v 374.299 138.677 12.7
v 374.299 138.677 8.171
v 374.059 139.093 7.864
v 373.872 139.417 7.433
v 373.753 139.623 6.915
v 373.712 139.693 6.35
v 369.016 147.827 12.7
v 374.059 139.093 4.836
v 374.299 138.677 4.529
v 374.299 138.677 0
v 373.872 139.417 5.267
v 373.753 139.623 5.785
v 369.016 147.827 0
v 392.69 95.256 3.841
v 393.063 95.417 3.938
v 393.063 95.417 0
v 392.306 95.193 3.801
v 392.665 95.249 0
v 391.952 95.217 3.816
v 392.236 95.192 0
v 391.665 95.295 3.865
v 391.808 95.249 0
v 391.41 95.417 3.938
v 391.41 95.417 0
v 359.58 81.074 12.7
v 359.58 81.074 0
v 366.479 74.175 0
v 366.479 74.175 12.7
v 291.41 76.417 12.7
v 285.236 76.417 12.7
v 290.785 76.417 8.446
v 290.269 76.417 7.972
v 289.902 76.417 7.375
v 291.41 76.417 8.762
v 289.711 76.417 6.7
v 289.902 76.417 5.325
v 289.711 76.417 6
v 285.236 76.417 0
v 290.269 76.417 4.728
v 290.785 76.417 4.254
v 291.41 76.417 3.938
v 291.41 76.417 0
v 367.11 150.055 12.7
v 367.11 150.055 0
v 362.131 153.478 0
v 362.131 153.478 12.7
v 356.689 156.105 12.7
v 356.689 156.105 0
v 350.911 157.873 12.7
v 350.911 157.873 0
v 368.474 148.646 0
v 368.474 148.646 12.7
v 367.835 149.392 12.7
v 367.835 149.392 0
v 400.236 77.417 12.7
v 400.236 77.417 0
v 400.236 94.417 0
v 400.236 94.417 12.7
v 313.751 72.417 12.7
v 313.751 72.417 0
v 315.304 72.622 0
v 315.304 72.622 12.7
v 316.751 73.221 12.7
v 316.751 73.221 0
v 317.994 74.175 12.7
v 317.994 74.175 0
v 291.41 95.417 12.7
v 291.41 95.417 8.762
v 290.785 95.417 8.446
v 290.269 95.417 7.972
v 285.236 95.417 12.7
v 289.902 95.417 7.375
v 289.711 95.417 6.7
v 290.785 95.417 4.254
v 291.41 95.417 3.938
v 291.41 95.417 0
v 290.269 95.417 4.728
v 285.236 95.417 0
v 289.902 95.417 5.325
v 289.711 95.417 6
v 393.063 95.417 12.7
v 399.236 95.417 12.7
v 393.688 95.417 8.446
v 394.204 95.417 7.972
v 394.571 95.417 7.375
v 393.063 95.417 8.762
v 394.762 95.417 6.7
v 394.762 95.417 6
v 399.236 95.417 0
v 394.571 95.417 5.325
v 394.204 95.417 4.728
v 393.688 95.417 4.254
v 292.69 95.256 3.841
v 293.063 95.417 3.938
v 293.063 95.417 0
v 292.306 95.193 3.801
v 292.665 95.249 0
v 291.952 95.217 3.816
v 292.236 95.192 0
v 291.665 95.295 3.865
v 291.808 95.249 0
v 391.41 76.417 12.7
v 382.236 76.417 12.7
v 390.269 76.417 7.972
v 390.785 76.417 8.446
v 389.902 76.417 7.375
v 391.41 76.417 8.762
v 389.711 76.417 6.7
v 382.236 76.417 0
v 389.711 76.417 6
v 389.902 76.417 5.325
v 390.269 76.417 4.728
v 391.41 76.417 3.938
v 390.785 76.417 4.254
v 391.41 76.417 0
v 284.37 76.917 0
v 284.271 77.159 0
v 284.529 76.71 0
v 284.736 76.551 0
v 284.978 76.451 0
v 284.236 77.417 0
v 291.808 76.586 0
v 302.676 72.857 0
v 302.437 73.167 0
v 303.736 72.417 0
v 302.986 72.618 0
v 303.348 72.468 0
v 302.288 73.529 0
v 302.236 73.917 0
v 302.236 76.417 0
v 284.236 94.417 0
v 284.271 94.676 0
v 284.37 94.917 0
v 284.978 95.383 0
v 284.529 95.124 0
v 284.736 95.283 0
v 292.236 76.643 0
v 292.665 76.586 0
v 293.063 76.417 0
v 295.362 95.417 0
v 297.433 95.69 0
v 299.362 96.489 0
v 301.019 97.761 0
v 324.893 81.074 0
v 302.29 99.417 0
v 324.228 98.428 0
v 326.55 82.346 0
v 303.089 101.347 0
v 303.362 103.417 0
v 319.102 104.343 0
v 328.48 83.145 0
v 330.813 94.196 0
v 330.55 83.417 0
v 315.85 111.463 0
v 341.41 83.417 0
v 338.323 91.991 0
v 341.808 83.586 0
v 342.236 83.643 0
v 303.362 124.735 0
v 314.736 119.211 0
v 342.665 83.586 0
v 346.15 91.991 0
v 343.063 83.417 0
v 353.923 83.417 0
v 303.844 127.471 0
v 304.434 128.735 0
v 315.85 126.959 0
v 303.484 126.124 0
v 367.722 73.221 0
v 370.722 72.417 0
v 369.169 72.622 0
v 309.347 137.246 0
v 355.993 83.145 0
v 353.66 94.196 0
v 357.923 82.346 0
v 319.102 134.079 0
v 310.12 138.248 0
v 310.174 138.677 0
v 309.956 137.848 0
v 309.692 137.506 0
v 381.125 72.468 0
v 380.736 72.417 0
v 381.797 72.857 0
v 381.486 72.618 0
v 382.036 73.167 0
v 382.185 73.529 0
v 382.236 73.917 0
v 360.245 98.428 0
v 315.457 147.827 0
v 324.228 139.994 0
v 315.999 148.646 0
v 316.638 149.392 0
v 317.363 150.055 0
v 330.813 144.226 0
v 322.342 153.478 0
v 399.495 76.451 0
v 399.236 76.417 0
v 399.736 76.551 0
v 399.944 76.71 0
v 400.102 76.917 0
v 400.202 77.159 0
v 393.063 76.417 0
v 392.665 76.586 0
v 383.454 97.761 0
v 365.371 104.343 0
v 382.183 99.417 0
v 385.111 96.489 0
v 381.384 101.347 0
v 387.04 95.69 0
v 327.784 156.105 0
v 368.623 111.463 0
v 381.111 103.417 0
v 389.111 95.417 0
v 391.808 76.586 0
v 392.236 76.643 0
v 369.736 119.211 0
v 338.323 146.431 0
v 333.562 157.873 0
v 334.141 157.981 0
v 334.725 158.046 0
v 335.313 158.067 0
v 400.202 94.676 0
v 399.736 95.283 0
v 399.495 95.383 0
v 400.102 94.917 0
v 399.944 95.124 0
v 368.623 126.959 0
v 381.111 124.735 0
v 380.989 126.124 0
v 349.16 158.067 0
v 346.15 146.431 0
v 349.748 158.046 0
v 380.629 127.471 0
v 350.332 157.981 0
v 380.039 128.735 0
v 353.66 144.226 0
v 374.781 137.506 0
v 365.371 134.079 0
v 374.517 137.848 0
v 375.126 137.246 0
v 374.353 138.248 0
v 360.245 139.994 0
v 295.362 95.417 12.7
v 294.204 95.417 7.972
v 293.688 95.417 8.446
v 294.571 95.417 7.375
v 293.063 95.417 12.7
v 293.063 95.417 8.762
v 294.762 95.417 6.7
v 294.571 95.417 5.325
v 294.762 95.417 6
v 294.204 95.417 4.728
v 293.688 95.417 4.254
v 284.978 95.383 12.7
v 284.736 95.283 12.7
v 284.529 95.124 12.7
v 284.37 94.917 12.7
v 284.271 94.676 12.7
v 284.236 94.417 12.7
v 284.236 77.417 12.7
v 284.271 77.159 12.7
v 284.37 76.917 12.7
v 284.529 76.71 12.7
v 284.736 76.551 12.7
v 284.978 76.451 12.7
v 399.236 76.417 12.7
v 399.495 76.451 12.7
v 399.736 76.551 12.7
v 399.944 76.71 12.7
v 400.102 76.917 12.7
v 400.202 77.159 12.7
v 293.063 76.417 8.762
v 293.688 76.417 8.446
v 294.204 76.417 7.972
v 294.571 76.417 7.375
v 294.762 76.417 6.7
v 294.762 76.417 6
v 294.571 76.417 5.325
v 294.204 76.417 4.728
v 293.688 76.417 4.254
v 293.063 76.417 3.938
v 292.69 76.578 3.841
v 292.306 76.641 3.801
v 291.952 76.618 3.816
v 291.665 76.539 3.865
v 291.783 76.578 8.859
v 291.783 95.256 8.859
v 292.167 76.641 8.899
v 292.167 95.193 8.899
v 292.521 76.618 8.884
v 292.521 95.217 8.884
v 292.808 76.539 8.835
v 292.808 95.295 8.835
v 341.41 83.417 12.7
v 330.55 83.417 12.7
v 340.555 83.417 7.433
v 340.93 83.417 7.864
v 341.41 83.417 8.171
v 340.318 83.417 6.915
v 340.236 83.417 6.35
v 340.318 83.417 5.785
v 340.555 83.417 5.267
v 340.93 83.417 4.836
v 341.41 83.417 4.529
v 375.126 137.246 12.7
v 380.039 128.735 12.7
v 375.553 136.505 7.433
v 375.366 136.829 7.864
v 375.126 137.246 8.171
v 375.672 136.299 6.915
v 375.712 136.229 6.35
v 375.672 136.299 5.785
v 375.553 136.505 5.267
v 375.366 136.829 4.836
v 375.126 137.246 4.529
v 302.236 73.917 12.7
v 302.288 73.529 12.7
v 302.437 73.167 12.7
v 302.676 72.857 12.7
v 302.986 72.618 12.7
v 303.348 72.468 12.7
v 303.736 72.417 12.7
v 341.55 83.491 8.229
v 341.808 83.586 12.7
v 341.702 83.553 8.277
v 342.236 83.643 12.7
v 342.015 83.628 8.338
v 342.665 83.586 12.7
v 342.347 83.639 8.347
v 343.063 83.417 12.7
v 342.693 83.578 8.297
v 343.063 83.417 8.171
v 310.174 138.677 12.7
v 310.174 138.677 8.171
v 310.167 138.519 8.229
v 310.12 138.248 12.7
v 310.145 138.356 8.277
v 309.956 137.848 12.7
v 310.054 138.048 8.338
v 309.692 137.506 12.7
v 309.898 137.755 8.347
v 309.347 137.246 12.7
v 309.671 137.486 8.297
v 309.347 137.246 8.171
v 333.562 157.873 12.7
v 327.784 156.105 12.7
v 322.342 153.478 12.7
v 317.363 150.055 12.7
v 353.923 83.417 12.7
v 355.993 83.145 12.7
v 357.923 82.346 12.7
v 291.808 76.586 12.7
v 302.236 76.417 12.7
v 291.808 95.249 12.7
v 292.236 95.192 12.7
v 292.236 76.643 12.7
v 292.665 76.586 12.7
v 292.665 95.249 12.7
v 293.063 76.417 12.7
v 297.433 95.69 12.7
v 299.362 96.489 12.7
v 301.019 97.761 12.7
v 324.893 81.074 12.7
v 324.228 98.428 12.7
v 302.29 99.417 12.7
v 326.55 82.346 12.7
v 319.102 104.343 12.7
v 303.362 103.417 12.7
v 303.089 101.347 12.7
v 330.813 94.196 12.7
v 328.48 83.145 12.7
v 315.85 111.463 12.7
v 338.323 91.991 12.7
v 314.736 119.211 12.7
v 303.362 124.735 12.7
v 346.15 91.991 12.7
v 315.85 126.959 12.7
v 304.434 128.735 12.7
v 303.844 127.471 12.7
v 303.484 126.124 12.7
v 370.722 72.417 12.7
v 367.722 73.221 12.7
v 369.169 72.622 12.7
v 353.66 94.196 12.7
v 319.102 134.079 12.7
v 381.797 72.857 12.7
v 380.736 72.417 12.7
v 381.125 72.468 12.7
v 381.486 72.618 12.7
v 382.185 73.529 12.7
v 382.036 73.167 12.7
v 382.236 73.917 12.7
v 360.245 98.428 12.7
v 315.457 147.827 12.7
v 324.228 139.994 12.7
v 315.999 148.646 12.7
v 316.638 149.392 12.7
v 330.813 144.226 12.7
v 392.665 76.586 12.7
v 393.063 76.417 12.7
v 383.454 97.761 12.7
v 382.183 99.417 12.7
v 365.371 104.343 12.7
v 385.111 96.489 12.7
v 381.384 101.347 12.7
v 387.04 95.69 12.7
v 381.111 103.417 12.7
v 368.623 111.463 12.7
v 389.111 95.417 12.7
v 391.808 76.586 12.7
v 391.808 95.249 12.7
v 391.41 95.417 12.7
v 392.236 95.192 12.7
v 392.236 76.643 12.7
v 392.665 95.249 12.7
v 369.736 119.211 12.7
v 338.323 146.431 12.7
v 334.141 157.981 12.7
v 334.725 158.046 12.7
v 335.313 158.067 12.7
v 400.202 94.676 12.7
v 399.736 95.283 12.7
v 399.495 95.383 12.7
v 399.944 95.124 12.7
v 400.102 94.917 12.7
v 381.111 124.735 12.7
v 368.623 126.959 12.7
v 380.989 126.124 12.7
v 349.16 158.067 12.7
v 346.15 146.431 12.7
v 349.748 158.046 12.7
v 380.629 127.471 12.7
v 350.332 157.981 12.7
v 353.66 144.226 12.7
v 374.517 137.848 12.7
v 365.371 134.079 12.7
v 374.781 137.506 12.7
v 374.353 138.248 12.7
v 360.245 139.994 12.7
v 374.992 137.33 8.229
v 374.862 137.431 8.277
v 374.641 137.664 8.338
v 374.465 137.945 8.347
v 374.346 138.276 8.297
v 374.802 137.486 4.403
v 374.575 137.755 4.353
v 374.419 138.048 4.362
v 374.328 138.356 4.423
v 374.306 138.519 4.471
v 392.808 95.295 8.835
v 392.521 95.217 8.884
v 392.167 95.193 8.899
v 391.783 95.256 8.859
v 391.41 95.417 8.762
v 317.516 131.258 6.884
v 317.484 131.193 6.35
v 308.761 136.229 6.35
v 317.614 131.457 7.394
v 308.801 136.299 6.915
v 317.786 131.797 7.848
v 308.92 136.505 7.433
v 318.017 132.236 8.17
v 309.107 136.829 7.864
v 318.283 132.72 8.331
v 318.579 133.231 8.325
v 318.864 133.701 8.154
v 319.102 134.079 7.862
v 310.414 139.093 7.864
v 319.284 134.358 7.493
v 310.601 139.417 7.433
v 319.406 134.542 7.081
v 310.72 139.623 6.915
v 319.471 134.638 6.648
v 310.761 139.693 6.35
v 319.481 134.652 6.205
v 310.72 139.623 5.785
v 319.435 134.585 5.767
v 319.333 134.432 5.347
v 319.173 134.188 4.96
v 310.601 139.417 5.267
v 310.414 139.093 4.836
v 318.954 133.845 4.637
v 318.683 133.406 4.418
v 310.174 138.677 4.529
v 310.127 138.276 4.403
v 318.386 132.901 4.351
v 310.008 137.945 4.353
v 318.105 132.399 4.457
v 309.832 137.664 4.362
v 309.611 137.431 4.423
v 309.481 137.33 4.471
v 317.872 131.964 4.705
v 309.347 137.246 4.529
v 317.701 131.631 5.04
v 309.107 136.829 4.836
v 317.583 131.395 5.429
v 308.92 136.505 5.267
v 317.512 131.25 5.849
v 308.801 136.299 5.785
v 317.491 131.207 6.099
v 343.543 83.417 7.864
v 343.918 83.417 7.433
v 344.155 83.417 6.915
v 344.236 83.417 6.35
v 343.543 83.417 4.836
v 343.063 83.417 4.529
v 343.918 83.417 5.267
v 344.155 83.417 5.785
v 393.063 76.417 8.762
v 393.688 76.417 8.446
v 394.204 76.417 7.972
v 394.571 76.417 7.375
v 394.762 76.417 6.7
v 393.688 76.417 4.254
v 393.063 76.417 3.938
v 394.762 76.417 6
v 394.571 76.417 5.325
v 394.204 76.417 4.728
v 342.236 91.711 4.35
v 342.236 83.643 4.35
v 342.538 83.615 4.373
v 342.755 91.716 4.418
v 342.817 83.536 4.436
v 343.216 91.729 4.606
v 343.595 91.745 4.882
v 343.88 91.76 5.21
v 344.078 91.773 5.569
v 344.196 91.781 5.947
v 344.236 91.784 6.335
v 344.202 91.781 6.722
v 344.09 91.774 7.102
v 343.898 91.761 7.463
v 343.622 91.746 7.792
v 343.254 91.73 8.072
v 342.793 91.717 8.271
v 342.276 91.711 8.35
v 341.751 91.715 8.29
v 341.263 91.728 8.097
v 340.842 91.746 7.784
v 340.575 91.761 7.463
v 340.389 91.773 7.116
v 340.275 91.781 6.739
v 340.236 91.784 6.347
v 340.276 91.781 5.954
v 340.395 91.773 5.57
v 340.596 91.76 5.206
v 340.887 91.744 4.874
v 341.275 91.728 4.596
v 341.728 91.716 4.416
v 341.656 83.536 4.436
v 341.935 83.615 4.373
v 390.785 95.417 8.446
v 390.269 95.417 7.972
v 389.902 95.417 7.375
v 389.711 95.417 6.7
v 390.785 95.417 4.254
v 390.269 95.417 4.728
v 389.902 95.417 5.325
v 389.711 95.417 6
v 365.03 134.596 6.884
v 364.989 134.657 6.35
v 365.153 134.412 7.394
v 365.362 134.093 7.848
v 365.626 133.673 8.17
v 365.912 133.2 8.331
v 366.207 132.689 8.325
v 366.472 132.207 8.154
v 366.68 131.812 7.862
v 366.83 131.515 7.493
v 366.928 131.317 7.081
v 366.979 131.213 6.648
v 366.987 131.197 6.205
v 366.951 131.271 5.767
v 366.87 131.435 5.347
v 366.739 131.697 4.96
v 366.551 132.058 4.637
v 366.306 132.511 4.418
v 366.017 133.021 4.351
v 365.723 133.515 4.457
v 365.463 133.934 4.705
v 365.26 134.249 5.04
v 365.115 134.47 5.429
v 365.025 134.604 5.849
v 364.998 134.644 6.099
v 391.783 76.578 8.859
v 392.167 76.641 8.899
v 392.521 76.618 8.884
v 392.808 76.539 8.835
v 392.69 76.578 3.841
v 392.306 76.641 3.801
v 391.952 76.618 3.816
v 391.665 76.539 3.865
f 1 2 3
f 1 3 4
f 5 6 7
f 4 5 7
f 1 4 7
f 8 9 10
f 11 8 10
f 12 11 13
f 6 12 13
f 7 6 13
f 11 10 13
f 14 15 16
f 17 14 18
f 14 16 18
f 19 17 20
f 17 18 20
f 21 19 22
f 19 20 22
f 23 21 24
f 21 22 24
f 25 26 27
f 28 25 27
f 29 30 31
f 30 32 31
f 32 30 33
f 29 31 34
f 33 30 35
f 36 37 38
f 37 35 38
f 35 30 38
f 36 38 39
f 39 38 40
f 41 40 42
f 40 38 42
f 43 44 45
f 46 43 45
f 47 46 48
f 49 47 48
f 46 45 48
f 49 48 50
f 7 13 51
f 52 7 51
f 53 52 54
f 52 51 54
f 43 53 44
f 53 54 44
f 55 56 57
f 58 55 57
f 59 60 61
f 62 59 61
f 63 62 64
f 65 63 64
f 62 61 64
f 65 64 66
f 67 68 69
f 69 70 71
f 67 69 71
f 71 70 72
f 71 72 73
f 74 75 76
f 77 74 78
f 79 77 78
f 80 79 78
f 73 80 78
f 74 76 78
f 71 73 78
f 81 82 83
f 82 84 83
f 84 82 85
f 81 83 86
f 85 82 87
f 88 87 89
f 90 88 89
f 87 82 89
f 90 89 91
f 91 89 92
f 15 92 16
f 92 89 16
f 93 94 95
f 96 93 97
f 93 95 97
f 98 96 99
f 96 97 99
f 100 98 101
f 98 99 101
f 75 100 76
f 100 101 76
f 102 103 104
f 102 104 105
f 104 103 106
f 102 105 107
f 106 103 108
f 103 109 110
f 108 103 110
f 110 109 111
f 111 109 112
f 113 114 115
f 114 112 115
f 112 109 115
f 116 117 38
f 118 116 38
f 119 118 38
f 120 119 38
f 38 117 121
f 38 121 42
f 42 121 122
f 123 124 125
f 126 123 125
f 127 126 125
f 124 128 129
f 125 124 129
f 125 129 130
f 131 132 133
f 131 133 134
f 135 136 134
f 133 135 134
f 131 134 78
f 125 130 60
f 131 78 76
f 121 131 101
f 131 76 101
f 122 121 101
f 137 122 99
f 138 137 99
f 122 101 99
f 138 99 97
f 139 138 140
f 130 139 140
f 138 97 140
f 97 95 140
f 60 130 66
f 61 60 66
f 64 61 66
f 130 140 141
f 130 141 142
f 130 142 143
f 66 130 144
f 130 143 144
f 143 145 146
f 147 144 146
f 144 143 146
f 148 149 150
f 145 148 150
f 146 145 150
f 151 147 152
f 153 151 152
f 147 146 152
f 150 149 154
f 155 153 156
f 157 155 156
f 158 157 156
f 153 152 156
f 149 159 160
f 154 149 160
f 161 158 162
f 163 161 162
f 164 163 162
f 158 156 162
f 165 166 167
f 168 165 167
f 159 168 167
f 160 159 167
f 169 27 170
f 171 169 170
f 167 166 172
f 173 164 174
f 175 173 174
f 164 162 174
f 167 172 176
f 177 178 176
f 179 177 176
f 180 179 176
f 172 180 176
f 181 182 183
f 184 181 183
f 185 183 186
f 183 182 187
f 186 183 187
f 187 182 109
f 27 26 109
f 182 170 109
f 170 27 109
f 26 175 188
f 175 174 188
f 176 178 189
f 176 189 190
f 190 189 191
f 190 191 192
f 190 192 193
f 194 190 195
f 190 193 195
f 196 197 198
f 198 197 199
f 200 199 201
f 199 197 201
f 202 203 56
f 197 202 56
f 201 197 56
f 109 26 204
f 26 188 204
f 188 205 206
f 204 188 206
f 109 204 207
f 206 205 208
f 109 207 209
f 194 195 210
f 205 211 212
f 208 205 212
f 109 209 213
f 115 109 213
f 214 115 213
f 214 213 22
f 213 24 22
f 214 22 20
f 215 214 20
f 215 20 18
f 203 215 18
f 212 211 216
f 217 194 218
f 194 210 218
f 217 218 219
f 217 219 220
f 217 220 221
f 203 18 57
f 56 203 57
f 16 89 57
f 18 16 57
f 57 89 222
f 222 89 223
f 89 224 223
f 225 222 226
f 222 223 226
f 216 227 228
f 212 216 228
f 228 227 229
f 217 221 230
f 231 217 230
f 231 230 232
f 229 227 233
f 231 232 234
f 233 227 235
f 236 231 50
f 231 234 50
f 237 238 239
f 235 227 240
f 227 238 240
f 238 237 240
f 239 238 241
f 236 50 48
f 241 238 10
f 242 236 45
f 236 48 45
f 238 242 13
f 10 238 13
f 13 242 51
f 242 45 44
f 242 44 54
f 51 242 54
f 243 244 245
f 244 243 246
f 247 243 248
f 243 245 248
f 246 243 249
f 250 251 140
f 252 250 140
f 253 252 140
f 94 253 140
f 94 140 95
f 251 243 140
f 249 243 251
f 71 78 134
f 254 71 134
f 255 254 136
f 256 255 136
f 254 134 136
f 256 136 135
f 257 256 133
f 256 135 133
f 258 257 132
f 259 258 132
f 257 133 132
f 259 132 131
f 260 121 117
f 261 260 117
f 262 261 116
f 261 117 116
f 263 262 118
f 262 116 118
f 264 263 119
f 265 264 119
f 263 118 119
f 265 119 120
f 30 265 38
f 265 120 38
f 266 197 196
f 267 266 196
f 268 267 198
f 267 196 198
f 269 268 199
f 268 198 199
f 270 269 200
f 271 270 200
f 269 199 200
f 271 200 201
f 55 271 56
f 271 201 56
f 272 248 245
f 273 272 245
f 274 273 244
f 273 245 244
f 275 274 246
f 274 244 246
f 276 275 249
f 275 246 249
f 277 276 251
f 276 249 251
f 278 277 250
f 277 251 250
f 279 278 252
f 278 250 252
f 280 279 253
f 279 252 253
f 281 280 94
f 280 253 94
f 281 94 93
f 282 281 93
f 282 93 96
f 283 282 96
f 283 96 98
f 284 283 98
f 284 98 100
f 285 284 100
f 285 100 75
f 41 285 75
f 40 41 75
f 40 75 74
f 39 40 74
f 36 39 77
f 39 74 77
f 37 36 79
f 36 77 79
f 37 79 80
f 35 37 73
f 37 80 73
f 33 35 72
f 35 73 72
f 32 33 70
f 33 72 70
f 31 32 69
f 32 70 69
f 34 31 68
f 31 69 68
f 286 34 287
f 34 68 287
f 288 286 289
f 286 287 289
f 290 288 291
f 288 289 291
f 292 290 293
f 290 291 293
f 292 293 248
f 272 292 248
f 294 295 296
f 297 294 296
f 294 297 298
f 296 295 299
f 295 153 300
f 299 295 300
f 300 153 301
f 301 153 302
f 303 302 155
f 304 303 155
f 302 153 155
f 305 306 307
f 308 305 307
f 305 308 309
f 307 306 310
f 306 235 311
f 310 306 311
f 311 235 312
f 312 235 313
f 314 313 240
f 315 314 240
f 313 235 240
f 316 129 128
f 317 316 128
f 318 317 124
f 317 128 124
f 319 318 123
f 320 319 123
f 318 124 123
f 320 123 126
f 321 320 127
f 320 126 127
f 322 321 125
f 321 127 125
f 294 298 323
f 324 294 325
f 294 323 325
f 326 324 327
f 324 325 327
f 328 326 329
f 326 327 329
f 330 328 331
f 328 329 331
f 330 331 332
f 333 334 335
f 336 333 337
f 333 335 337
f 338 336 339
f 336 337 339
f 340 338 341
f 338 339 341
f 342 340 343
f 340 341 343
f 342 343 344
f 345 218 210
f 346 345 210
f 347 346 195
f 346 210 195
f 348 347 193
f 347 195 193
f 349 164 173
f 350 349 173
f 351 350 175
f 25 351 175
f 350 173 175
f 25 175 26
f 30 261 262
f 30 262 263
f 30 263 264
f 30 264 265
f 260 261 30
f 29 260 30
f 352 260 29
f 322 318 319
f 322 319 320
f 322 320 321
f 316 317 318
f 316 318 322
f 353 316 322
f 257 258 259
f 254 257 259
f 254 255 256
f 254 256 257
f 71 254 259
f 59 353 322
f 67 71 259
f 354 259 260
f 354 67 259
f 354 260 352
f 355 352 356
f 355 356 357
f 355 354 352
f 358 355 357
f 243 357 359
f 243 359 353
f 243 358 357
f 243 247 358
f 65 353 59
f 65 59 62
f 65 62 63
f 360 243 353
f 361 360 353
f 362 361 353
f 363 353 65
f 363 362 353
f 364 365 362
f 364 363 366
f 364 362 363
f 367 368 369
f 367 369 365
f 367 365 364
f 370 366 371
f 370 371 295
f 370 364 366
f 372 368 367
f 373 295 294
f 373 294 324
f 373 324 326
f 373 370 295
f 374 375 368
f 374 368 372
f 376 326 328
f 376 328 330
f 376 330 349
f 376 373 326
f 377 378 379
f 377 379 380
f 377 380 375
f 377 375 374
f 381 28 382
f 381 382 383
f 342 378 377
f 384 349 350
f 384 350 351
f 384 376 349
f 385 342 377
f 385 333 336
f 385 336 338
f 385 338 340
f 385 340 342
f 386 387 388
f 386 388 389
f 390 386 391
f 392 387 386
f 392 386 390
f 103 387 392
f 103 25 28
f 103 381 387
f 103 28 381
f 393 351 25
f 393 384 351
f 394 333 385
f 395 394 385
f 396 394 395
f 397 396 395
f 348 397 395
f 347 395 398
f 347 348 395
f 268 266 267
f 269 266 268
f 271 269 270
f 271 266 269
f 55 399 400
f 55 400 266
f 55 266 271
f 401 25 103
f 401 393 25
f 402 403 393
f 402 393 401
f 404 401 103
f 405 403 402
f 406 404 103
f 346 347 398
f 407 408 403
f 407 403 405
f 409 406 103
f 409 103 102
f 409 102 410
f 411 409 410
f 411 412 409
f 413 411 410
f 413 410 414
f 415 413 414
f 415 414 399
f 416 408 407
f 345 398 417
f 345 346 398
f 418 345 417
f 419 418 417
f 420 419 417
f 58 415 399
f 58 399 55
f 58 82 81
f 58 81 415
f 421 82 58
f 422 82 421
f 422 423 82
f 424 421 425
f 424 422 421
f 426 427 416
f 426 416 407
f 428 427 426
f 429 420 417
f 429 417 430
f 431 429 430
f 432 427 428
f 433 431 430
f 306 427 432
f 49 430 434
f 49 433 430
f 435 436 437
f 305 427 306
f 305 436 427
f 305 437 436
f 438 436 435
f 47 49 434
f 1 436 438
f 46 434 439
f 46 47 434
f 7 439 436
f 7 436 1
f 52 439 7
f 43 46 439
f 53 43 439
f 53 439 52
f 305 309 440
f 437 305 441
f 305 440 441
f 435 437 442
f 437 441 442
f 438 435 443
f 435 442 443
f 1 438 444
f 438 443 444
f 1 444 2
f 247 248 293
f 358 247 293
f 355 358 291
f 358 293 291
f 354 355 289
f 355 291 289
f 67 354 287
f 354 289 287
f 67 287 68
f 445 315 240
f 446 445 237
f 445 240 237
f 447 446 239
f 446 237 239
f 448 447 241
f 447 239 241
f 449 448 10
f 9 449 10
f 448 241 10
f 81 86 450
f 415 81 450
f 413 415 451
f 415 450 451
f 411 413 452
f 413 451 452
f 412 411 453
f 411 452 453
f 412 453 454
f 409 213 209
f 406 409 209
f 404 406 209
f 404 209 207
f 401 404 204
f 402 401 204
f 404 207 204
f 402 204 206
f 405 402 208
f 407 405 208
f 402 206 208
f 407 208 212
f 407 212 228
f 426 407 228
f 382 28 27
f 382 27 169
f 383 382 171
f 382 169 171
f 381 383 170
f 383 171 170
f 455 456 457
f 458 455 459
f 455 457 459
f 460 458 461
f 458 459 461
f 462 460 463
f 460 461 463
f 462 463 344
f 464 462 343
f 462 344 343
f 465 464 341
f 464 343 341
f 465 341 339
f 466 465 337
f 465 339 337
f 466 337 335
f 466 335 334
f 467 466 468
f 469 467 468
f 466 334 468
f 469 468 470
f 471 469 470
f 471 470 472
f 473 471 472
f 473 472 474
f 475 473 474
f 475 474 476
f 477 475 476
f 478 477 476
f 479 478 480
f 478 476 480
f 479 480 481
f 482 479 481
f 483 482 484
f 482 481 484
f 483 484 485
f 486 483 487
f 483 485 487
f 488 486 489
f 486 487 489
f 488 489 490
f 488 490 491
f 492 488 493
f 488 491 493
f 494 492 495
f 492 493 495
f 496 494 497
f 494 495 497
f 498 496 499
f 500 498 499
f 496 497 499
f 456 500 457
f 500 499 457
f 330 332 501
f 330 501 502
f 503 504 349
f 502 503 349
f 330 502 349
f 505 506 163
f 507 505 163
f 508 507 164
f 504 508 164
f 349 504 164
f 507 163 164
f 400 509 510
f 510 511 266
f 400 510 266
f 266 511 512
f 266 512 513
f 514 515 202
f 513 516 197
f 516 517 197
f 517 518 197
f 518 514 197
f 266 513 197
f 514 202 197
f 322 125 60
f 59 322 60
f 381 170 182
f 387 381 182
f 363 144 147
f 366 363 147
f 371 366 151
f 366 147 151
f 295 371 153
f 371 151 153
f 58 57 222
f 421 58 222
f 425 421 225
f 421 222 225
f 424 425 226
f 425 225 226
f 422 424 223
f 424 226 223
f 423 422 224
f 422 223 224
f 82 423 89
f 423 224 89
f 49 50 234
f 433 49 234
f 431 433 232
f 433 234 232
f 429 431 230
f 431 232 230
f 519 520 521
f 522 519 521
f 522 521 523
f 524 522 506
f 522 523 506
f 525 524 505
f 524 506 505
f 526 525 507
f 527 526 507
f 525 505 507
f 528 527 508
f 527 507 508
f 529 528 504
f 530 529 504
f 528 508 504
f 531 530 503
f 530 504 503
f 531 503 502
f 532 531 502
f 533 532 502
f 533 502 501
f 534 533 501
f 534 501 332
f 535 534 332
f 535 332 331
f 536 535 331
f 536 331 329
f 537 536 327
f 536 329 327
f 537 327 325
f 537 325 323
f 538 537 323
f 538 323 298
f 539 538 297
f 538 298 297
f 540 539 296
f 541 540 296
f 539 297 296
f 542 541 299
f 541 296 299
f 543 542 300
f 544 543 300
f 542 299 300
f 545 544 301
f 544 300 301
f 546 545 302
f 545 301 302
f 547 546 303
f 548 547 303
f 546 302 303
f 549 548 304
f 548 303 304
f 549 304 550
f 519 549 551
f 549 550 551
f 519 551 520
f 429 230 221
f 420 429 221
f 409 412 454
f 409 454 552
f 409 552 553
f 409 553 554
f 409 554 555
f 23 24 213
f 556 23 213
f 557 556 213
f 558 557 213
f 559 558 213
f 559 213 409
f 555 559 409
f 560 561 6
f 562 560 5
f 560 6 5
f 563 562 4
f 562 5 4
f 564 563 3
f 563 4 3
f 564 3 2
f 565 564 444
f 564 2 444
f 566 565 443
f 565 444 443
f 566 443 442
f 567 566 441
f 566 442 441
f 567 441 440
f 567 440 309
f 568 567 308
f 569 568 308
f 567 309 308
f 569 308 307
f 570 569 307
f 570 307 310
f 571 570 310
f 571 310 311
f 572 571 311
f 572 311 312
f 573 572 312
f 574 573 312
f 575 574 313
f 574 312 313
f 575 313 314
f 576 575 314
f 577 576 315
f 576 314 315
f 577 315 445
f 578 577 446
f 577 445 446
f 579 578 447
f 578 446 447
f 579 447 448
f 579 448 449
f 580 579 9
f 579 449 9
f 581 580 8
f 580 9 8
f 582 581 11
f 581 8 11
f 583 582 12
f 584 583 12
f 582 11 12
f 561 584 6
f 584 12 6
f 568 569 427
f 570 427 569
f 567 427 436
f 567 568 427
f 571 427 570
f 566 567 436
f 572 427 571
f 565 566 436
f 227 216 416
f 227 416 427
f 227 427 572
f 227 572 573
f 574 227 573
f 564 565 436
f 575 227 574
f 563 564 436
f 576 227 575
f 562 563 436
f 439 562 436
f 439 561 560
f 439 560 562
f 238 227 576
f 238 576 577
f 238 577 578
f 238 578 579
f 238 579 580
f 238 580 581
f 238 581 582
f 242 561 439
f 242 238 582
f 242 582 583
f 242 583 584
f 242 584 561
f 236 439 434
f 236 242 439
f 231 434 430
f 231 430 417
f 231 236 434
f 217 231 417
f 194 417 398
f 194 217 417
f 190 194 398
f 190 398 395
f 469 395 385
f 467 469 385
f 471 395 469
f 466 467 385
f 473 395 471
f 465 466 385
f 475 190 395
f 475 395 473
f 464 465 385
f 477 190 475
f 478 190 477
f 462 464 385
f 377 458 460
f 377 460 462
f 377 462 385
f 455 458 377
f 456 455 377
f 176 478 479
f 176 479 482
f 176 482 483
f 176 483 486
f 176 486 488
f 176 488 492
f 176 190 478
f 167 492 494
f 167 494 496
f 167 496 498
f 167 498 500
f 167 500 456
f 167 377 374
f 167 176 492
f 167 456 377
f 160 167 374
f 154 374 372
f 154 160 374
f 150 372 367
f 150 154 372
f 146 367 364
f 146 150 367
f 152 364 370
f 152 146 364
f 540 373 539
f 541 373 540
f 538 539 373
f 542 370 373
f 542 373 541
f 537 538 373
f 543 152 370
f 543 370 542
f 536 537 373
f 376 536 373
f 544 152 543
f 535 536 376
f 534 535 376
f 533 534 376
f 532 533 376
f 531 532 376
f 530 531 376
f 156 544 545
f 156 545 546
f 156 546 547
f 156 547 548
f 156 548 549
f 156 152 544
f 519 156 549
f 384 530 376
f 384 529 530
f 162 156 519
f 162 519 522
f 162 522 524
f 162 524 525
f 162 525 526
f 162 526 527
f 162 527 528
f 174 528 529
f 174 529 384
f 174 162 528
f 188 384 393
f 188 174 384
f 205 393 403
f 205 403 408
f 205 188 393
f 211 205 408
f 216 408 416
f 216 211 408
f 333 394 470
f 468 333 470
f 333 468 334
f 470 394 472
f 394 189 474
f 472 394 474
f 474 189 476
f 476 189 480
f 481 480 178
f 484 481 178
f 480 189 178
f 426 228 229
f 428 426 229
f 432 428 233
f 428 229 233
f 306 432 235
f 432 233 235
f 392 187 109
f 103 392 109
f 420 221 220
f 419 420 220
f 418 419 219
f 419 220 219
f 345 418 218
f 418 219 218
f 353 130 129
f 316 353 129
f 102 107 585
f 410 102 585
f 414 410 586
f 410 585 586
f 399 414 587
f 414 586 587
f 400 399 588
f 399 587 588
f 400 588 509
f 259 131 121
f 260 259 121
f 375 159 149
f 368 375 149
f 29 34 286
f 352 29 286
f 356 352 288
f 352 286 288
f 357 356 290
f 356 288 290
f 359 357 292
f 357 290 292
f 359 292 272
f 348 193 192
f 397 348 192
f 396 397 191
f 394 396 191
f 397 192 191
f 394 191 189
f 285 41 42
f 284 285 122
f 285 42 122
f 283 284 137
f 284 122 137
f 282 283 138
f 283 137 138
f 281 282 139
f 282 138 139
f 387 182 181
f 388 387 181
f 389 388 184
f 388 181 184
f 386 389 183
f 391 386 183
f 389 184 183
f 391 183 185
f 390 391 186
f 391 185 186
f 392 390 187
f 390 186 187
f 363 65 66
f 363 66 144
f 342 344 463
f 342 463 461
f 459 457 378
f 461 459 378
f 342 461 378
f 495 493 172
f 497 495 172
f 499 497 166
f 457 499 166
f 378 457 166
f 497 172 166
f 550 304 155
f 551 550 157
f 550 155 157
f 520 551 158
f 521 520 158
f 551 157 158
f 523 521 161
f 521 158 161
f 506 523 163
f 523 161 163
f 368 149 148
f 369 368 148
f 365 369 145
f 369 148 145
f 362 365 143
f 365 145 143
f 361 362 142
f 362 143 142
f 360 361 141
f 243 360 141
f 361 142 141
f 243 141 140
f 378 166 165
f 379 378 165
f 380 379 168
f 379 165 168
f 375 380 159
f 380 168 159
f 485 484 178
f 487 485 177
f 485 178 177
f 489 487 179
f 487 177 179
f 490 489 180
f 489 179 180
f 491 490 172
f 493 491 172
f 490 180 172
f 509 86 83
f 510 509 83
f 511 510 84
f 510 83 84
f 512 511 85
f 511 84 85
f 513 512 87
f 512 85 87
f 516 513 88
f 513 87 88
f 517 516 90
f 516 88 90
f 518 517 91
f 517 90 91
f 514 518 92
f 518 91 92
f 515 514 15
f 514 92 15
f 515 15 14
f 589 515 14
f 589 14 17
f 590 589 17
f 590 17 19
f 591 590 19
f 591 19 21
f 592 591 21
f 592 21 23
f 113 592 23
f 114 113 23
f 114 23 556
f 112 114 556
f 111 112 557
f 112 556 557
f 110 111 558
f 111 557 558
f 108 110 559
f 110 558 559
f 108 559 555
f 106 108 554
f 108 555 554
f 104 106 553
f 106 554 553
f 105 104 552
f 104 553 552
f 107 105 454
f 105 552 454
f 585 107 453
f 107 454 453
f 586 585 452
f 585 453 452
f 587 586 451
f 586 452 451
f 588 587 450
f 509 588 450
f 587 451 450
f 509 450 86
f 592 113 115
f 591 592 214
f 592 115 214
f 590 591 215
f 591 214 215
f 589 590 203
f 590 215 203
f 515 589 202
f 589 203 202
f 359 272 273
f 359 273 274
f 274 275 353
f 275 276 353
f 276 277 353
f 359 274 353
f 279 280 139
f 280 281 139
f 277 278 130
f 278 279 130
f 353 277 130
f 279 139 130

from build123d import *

# Parameters (mm, degrees)
SKETCH1_R           = 27.500000001
BOSS_EXTRUDE1_DEPTH = 12.7
SKETCH2_R           = 2.55
CUT_EXTRUDE1_DEPTH  = 406.309199291
SKETCH4_R           = 2
CUT_EXTRUDE2_DEPTH  = 15
SKETCH5_R           = 2
CUT_EXTRUDE3_DEPTH  = 15
SKETCH3_R           = 2
CUT_EXTRUDE4_DEPTH  = 15


with BuildPart() as part:
    # Sketch1 → Boss-Extrude1 (new body)
    with BuildSketch(Plane.XY):
        with BuildLine():
            Line((284.236473266, 94.417355971), (284.236473266, 77.41735597))
            ThreePointArc((284.236473266, 77.41735597), (284.529366484, 76.71024919), (285.236473265, 76.417355971))
            Line((285.236473265, 76.417355971), (291.410292076, 76.417355971))
            ThreePointArc((291.410292076, 76.417355971), (292.236473265, 76.642955971), (293.062654455, 76.417355971))
            Line((293.062654455, 76.417355971), (302.236473265, 76.417355971))
            Line((302.236473265, 76.417355971), (302.236473265, 73.91735597))
            ThreePointArc((302.236473265, 73.91735597), (302.675813094, 72.856695799), (303.736473265, 72.41735597))
            Line((303.736473265, 72.41735597), (313.751191892, 72.41735597))
            ThreePointArc((313.751191892, 72.41735597), (316.047292486, 72.874078775), (317.993832578, 74.174715283))
            Line((317.993832578, 74.174715283), (324.893327515, 81.074210219))
            ThreePointArc((324.893327515, 81.074210219), (327.488714305, 82.80839223), (330.550181764, 83.417355969))
            Line((330.550181764, 83.417355969), (341.410292075, 83.417355969))
            ThreePointArc((341.410292075, 83.417355969), (342.236473267, 83.642955969), (343.062654458, 83.417355968))
            Line((343.062654458, 83.417355968), (353.922764767, 83.417355968))
            ThreePointArc((353.922764767, 83.417355968), (356.984232225, 82.808392228), (359.579619016, 81.074210218))
            Line((359.579619016, 81.074210218), (366.479113952, 74.174715282))
            ThreePointArc((366.479113952, 74.174715282), (368.425654045, 72.874078773), (370.72175464, 72.417355968))
            Line((370.72175464, 72.417355968), (380.736473265, 72.417355968))
            ThreePointArc((380.736473265, 72.417355968), (381.797133436, 72.856695796), (382.236473264, 73.917355967))
            Line((382.236473264, 73.917355967), (382.236473264, 76.417355972))
            Line((382.236473264, 76.417355972), (391.410292073, 76.417355972))
            ThreePointArc((391.410292073, 76.417355972), (392.236473265, 76.642955972), (393.062654456, 76.417355971))
            Line((393.062654456, 76.417355971), (399.236473264, 76.417355971))
            ThreePointArc((399.236473264, 76.417355971), (399.943580044, 76.71024919), (400.236473263, 77.41735597))
            Line((400.236473263, 77.41735597), (400.236473263, 94.417355971))
            ThreePointArc((400.236473263, 94.417355971), (399.943580044, 95.124462751), (399.236473264, 95.41735597))
            Line((399.236473264, 95.41735597), (393.062654456, 95.41735597))
            ThreePointArc((393.062654456, 95.41735597), (392.236473265, 95.191755969), (391.410292073, 95.417355969))
            Line((391.410292073, 95.417355969), (389.110963045, 95.417355969))
            ThreePointArc((389.110963045, 95.417355969), (383.454108795, 97.760501719), (381.110963044, 103.417355969))
            Line((381.110963044, 103.417355969), (381.110963044, 124.734871013))
            ThreePointArc((381.110963044, 124.734871013), (380.838369654, 126.805423374), (380.039166274, 128.734871013))
            Line((380.039166274, 128.734871013), (375.125516501, 137.245562071))
            ThreePointArc((375.125516501, 137.245562071), (374.517050575, 137.848255971), (374.299335311, 138.676549871))
            Line((374.299335311, 138.676549871), (369.016145298, 147.8273034))
            ThreePointArc((369.016145298, 147.8273034), (368.165927768, 149.029042515), (367.109909002, 150.054650194))
            ThreePointArc((367.109909002, 150.054650194), (359.459956736, 154.89532039), (350.910948847, 157.873293146))
            ThreePointArc((350.910948847, 157.873293146), (350.040616408, 158.018692254), (349.159565162, 158.06735597))
            Line((349.159565162, 158.06735597), (335.313381368, 158.06735597))
            ThreePointArc((335.313381368, 158.06735597), (334.432330122, 158.018692254), (333.561997683, 157.873293146))
            ThreePointArc((333.561997683, 157.873293146), (325.012989794, 154.89532039), (317.363037528, 150.054650194))
            ThreePointArc((317.363037528, 150.054650194), (316.307018762, 149.029042515), (315.456801232, 147.8273034))
            Line((315.456801232, 147.8273034), (310.173611219, 138.676549871))
            ThreePointArc((310.173611219, 138.676549871), (309.955895955, 137.848255971), (309.34743003, 137.245562072))
            Line((309.34743003, 137.245562072), (304.433780256, 128.734871013))
            ThreePointArc((304.433780256, 128.734871013), (303.634576876, 126.805423374), (303.361983486, 124.734871013))
            Line((303.361983486, 124.734871013), (303.361983486, 103.417355969))
            ThreePointArc((303.361983486, 103.417355969), (301.018837735, 97.76050172), (295.361983486, 95.41735597))
            Line((295.361983486, 95.41735597), (293.062654455, 95.41735597))
            ThreePointArc((293.062654455, 95.41735597), (292.236473265, 95.19175597), (291.410292076, 95.41735597))
            Line((291.410292076, 95.41735597), (285.236473265, 95.41735597))
            ThreePointArc((285.236473265, 95.41735597), (284.529366484, 95.124462751), (284.236473266, 94.417355971))
        make_face()
        with Locations((342.236473265, 119.21105597)):
            Circle(SKETCH1_R, mode=Mode.SUBTRACT)
    extrude(amount=BOSS_EXTRUDE1_DEPTH)

    # Sketch2 → Cut-Extrude1 (cut, through all)
    with BuildSketch(Plane(origin=(0, 95.41735597, 0), x_dir=(1, 0, 0), z_dir=(0, 1, 0))):
        with Locations(Location((292.236473265, -6.35, 0), (0, 0, 288.904554562))):
            Circle(SKETCH2_R)
        with Locations(Location((392.236473265, -6.35, 0), (0, 0, 288.904554598))):
            Circle(SKETCH2_R)
    extrude(amount=-CUT_EXTRUDE1_DEPTH, mode=Mode.SUBTRACT)

    # Sketch4 → Cut-Extrude2 (cut)
    with BuildSketch(Plane(origin=(172.581500867, -99.639975983, 0), x_dir=(0, 0, 1), z_dir=(-0.8660254037844396, 0.49999999999999856, 0))):
        with Locations(Location((6.35, 274.358039516, 0), (0, 0, 270))):
            Circle(SKETCH4_R)
    extrude(amount=-CUT_EXTRUDE2_DEPTH, mode=Mode.SUBTRACT)

    # Sketch5 → Cut-Extrude3 (cut)
    with BuildSketch(Plane(origin=(340.773209032, 196.745503967, 0), x_dir=(0, 0, -1), z_dir=(0.8660254037844377, 0.5000000000000019, 0))):
        with Locations(Location((-6.35, -67.87843375, 0), (0, 0, 90))):
            Circle(SKETCH5_R)
    extrude(amount=-CUT_EXTRUDE3_DEPTH, mode=Mode.SUBTRACT)

    # Sketch3 → Cut-Extrude4 (cut)
    with BuildSketch(Plane.XZ.offset(-83.417355968)):
        with Locations(Location((342.236473266, 6.35, 0), (0, 0, 270))):
            Circle(SKETCH3_R)
    extrude(amount=-CUT_EXTRUDE4_DEPTH, mode=Mode.SUBTRACT)


solid = part.part
